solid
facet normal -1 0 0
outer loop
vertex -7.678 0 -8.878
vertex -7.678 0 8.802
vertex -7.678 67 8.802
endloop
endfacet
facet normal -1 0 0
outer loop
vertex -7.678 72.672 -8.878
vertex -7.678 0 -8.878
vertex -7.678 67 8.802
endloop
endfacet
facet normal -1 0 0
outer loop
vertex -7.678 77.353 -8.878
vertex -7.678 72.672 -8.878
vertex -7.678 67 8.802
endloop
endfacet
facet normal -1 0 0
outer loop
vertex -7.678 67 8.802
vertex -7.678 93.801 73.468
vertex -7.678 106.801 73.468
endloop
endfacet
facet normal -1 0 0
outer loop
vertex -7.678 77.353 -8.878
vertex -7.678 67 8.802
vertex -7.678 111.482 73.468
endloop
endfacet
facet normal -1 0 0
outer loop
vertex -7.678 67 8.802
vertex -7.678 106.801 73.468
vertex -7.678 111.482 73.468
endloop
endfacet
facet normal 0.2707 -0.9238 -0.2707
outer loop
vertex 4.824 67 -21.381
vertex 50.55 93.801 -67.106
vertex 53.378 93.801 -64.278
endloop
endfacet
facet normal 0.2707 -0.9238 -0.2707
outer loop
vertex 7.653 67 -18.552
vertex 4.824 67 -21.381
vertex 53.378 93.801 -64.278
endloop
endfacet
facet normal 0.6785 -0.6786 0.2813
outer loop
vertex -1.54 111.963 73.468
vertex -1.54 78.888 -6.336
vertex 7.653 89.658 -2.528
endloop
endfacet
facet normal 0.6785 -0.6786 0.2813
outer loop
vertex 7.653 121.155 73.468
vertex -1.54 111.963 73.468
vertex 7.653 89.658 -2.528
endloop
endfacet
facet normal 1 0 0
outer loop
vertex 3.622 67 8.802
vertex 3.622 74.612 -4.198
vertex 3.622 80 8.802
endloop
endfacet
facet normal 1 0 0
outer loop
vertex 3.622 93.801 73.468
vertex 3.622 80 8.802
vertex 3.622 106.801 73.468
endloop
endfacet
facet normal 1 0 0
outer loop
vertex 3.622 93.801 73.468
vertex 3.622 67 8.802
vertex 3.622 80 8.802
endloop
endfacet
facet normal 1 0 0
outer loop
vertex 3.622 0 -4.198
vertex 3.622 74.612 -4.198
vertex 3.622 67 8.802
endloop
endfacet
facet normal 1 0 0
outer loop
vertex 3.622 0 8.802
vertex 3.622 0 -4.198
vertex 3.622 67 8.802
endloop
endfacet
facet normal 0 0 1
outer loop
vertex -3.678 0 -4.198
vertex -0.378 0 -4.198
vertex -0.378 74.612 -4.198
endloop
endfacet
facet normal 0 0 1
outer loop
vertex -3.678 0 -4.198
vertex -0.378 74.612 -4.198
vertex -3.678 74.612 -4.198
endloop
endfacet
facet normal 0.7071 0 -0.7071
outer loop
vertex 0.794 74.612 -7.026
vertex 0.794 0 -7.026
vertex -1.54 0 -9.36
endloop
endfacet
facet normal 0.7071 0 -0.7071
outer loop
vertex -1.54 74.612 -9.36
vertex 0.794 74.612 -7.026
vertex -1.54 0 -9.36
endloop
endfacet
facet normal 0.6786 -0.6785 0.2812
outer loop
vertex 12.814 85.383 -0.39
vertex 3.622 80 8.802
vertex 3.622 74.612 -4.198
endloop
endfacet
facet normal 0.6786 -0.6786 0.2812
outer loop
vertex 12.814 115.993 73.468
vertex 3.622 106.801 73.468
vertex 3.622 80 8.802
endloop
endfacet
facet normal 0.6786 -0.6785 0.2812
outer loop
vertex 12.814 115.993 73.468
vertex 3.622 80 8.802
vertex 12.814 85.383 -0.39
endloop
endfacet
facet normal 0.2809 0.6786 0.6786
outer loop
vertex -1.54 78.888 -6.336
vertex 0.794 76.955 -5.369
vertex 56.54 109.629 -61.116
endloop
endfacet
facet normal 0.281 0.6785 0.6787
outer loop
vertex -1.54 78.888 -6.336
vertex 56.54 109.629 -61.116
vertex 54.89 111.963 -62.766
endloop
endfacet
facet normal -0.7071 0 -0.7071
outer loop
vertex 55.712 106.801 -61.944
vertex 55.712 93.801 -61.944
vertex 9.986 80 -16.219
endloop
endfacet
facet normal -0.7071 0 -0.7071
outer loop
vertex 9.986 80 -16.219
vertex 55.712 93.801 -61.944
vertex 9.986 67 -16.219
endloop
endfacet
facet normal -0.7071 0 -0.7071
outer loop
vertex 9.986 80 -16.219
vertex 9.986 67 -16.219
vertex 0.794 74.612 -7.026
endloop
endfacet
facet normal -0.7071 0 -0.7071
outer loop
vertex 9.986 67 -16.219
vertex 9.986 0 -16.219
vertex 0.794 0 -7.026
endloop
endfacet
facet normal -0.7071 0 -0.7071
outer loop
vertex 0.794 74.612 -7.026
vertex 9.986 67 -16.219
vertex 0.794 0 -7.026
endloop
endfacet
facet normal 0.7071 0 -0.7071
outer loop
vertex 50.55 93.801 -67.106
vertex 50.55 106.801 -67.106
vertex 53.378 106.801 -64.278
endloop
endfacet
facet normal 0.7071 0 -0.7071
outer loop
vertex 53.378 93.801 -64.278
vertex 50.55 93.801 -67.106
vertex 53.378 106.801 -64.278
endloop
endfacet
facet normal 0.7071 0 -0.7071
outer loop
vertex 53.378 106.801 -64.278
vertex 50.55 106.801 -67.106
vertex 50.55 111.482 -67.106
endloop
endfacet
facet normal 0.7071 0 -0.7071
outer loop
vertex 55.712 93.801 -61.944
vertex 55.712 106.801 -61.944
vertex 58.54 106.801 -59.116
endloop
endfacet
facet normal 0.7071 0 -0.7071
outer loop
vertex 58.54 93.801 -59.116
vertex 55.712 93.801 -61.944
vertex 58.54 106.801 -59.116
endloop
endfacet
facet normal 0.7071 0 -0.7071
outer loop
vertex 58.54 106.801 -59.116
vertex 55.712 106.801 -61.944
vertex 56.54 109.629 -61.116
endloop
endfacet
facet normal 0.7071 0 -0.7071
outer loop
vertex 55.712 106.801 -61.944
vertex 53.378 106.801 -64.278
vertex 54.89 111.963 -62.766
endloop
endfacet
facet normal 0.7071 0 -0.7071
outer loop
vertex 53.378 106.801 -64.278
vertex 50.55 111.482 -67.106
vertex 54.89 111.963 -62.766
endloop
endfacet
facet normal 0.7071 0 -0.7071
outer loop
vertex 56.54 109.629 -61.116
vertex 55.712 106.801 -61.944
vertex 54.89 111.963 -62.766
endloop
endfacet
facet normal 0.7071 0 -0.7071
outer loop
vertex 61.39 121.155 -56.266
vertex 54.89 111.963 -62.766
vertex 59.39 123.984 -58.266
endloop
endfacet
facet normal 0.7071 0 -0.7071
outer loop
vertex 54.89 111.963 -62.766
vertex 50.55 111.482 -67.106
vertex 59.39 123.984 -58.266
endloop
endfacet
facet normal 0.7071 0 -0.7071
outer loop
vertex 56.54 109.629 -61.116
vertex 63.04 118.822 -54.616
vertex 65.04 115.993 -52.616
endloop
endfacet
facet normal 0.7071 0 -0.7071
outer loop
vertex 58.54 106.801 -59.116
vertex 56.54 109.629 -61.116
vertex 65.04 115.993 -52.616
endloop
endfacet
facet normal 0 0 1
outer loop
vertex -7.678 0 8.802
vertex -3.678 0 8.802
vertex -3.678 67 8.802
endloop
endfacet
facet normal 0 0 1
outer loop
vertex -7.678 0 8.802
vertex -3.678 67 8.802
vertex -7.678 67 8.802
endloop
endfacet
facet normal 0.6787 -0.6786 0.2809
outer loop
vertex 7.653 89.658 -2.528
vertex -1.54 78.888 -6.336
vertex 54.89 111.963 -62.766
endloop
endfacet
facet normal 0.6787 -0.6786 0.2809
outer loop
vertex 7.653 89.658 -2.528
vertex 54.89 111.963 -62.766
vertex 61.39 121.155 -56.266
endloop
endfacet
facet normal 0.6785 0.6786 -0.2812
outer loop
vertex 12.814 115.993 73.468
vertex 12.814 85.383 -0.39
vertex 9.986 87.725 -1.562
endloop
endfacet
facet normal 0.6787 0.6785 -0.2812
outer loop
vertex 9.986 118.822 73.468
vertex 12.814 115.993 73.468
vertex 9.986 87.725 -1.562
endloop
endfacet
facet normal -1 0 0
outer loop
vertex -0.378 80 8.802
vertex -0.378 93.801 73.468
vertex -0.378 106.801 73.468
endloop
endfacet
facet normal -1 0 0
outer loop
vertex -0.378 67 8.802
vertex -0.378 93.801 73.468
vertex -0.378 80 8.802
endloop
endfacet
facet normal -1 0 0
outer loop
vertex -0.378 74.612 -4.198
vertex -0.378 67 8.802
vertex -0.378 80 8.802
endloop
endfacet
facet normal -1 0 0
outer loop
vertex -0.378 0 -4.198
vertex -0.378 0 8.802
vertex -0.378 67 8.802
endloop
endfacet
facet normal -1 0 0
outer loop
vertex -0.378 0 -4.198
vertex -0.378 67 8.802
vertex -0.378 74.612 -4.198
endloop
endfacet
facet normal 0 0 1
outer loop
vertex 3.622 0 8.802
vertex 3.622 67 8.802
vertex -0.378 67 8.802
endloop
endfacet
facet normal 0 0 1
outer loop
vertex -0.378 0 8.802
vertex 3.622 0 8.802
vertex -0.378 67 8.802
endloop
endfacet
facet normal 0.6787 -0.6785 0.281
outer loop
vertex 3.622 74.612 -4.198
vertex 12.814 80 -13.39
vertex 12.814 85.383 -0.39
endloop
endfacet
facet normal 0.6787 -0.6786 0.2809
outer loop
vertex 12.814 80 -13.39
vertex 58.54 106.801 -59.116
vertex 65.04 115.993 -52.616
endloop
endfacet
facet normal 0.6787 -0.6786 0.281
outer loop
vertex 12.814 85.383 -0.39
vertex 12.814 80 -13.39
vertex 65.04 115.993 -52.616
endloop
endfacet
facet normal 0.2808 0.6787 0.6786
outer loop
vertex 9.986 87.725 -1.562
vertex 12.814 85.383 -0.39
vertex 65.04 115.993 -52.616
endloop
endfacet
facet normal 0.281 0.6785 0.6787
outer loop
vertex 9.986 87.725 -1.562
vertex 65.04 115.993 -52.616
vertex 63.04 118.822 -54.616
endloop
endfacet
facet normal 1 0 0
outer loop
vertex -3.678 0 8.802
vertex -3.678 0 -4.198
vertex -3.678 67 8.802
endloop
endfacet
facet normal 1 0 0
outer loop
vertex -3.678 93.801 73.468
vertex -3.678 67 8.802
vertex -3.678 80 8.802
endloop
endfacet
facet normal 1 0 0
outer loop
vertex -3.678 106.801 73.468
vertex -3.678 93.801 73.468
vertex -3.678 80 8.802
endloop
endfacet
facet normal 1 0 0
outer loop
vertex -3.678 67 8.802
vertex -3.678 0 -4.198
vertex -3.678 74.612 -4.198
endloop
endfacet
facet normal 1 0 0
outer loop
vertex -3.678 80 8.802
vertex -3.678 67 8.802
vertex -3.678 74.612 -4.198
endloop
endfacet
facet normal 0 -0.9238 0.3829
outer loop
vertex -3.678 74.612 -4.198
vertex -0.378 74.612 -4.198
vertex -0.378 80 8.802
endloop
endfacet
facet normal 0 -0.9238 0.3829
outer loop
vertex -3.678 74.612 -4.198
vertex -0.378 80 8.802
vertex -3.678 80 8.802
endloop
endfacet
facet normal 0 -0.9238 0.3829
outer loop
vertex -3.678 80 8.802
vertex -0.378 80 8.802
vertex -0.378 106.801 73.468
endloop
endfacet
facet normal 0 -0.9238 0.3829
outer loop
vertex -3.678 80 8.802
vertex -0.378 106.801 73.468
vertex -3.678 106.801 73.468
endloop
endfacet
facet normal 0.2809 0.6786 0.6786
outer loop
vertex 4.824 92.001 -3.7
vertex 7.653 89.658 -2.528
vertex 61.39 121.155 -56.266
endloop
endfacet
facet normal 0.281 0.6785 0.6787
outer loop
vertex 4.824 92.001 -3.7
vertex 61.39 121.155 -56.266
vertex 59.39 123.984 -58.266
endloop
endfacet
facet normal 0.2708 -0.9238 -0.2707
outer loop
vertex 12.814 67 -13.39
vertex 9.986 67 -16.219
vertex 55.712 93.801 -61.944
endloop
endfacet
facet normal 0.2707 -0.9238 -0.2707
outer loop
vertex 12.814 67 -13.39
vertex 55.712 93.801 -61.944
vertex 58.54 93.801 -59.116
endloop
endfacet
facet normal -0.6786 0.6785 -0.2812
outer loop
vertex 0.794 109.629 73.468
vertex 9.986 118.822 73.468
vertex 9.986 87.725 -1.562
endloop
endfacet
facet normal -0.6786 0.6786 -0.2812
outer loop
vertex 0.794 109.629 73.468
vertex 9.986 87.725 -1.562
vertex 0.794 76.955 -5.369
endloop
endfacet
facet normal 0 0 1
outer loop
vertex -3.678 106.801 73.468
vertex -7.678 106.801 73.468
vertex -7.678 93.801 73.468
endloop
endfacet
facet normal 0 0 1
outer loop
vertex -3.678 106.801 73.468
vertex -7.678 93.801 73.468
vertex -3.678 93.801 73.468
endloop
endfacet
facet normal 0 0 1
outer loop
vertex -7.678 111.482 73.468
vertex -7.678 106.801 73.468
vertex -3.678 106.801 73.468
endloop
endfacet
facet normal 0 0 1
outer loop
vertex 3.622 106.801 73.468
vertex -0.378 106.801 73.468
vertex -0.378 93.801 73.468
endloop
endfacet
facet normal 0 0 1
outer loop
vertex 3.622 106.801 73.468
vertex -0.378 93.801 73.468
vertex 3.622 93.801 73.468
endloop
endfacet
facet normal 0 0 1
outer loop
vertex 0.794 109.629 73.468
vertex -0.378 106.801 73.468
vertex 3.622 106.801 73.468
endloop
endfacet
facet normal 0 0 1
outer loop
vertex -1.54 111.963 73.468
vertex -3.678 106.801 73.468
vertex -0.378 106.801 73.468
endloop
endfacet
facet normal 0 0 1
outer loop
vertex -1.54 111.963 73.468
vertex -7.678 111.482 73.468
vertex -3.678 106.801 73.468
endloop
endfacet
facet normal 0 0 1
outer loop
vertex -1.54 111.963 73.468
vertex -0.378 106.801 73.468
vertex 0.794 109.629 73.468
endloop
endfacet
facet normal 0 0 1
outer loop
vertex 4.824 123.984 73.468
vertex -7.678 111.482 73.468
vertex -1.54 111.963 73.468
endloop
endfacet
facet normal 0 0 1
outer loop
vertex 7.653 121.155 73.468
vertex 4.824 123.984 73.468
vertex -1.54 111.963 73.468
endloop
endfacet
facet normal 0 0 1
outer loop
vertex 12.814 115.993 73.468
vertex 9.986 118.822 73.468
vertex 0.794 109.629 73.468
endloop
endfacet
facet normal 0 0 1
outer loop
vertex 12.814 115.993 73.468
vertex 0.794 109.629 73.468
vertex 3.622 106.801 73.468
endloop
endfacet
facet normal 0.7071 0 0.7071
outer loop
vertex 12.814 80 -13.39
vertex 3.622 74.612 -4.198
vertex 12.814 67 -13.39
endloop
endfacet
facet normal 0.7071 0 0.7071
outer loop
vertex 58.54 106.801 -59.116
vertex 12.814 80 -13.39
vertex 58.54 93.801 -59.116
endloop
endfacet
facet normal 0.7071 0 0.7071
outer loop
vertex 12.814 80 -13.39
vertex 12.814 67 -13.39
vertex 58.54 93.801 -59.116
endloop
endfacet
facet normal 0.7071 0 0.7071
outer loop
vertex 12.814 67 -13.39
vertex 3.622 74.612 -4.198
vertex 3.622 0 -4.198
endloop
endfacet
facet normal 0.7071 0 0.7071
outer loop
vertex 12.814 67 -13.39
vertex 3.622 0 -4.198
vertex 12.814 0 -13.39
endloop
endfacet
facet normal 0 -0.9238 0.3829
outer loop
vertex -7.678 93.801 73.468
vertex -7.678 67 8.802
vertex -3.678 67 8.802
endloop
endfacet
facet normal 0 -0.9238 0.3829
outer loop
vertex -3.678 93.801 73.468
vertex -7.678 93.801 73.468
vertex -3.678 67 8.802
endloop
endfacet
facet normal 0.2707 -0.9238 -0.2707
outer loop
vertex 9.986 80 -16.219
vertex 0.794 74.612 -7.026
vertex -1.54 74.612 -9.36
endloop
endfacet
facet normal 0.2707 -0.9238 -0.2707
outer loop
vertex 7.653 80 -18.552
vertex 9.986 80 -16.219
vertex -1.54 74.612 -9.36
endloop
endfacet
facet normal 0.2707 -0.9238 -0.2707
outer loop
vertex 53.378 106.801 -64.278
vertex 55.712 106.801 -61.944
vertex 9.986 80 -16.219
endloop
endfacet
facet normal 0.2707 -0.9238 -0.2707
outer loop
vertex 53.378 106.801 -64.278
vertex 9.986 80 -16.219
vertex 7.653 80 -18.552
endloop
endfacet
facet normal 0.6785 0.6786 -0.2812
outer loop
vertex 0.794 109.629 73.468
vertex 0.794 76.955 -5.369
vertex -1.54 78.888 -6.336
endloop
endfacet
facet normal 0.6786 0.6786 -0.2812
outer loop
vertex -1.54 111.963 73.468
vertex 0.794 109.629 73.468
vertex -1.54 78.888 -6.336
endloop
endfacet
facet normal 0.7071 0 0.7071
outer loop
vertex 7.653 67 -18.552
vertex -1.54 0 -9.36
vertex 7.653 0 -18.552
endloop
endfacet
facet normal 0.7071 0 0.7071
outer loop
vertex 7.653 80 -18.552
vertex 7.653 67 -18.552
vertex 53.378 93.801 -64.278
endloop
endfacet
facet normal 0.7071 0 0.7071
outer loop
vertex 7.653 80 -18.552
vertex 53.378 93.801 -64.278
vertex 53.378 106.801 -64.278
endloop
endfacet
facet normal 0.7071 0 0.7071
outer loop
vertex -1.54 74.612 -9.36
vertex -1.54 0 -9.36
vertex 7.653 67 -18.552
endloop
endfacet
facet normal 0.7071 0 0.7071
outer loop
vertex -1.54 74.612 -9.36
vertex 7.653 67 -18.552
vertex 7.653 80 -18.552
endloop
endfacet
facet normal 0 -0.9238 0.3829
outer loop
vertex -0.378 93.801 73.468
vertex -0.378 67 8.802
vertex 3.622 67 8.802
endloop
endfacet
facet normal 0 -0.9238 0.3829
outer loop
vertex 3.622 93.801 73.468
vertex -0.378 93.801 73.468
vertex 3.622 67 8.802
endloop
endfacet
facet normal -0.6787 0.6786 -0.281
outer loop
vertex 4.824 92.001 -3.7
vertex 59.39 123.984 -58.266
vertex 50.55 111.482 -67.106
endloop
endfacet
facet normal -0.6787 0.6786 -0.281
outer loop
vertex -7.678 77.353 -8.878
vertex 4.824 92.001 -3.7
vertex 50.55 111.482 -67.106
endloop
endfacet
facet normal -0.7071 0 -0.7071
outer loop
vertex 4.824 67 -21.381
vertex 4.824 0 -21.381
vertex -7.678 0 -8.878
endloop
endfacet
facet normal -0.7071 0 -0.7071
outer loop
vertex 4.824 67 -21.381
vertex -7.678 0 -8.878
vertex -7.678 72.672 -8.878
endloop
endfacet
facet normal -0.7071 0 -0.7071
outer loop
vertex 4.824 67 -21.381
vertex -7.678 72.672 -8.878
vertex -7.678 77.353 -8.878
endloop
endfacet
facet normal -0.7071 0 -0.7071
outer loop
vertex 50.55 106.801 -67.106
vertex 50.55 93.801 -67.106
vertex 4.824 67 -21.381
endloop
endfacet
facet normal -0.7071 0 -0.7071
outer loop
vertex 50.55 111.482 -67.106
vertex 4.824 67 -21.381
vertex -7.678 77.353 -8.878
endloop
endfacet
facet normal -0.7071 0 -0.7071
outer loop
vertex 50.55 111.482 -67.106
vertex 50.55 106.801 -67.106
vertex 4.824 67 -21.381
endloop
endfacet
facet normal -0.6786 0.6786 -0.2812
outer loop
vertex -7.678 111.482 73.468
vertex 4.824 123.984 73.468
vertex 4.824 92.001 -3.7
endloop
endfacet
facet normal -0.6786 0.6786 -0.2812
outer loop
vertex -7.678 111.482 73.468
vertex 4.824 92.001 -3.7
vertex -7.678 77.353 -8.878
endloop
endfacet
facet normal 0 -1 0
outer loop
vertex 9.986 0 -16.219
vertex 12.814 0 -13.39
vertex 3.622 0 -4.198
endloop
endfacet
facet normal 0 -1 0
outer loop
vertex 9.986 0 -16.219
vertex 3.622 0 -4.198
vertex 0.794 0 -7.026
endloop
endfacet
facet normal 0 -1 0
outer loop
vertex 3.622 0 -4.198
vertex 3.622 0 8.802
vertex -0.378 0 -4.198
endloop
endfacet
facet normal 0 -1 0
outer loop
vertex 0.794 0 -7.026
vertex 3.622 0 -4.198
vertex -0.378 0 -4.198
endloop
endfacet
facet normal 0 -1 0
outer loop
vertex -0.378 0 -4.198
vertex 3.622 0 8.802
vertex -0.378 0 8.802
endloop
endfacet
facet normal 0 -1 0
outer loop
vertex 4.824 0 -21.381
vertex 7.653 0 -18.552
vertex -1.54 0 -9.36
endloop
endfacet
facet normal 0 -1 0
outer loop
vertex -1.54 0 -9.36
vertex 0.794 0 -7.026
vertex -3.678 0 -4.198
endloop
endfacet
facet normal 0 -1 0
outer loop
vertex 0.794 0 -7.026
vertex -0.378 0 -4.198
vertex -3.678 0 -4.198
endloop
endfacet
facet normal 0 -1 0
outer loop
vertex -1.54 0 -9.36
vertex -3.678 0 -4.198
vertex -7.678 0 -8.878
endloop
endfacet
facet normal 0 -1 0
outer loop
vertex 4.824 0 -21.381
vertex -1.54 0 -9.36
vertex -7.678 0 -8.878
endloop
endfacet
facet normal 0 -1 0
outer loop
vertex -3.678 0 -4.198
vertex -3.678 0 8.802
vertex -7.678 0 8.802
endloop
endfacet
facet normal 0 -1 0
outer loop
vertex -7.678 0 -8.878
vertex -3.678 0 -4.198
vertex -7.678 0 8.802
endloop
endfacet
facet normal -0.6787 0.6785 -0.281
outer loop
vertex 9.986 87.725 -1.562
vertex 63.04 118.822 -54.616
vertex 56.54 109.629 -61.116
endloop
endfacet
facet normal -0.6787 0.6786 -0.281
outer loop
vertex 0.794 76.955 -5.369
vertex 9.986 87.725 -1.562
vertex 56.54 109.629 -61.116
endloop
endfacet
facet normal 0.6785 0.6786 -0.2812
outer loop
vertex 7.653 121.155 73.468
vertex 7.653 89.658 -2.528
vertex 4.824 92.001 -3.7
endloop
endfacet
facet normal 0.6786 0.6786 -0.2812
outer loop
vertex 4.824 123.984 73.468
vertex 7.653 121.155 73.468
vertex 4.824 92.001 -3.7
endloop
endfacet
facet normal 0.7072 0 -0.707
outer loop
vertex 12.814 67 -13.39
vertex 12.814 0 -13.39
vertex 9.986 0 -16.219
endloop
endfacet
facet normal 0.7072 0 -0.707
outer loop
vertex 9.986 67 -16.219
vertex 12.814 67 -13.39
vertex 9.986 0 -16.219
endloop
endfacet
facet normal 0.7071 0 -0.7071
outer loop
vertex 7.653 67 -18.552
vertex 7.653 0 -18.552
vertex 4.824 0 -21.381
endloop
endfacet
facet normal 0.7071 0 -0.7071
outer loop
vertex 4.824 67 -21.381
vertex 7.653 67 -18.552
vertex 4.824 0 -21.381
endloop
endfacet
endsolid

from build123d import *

# Parameters (mm, degrees)
BOSS_EXTRUDE1_DEPTH = 80
CUT_EXTRUDE2_DEPTH  = 82.280481137
SKETCH6_W           = 4
SKETCH6_H           = 13
BOSS_EXTRUDE6_DEPTH = 70
BOSS_EXTRUDE7_REACH = 148.386
BOSS_EXTRUDE8_REACH = 152.425


with BuildPart() as part:
    # Sketch1 → Boss-Extrude1 (new body)
    with BuildSketch(Plane(origin=(0, 0, 0), x_dir=(1, 0, 0), z_dir=(0, 1, 0))):
        Polygon((3.622068507, 4.197822071), (3.622068507, -8.802177929), (-0.377931493, -8.802177929), (-0.377931493, 4.197822071), (-3.677931493, 4.197822071), (-3.677931493, -8.802177929), (-7.677931493, -8.802177929), (-7.677931493, 8.878435326), align=None)
    extrude(amount=BOSS_EXTRUDE1_DEPTH)

    # Sketch2 → Cut-Extrude2 (cut, through all)
    with BuildSketch(Plane.ZY.offset(7.677931493)):
        Polygon((8.802177929, 80), (-8.878435326, 80), (-8.878435326, 72.672231838), align=None)
    extrude(amount=-CUT_EXTRUDE2_DEPTH, mode=Mode.SUBTRACT)

    # Sketch6 → Boss-Extrude6 (add, along a direction that is not the sketch's normal)
    with BuildSketch(Plane.XY.offset(8.802177929)):
        with Locations((-5.677931493, 73.5)):
            Rectangle(SKETCH6_W, SKETCH6_H)
        with Locations((1.622068507, 73.5)):
            Rectangle(SKETCH6_W, SKETCH6_H)
    extrude(amount=BOSS_EXTRUDE6_DEPTH, dir=(0, 0.38287155344466034, 0.9238015877681054))

    # Boss-Extrude7: up to this plane
    boss_extrude7_end = Plane(origin=(3.622068507, 80, -4.197822071), z_dir=(-0.3826834323650841, 0, 0.9238795325112892))
    # Sketch7 → Boss-Extrude7 (add, up to the surface)
    with BuildSketch(Plane.XY.offset(73.468289073), mode=Mode.PRIVATE) as boss_extrude7_sk1:
        Polygon((3.622068507, 106.801008741), (-7.677931493, 106.801008741), (-7.677931493, 111.481621996), align=None)
    boss_extrude7_tool1 = split(extrude(boss_extrude7_sk1.sketch, amount=BOSS_EXTRUDE7_REACH, dir=(0, -0.382871553445, -0.923801587768), mode=Mode.PRIVATE), bisect_by=boss_extrude7_end, keep=Keep.BOTH, mode=Mode.PRIVATE)
    add(boss_extrude7_tool1.solids().sort_by_distance((-3.911265, 108.361213, 73.468289))[0])

    # Boss-Extrude8: up to this plane
    boss_extrude8_end = Plane(origin=(3.622068507, 80, -4.197822071), z_dir=(-0.3826834323650841, 0, 0.9238795325112892))
    # Sketch14 → Boss-Extrude8 (add, up to the surface)
    with BuildSketch(Plane.XY.offset(73.468289073), mode=Mode.PRIVATE) as boss_extrude8_sk1:
        Polygon((7.65257716, 121.155276399), (4.824150035, 123.983703524), (-7.677931493, 111.481621996), (3.622068507, 106.801008741), (12.814456663, 115.993396897), (9.986029538, 118.821824021), (0.793641383, 109.629435866), (-1.539810995, 111.962888244), align=None)
    boss_extrude8_tool1 = split(extrude(boss_extrude8_sk1.sketch, amount=BOSS_EXTRUDE8_REACH, dir=(0, -0.382871553445, -0.923801587768), mode=Mode.PRIVATE), bisect_by=boss_extrude8_end, keep=Keep.BOTH, mode=Mode.PRIVATE)
    add(boss_extrude8_tool1.solids().sort_by_distance((6.049263, 122.380389, 73.468289))[0])

    # Mirror9: part across plane


with BuildPart() as part_1:
    add(part.part)
    add(part.part.mirror(Plane(origin=(2.014593878, 0, -4.863659863), x_dir=(0.9238795325112891, 0, 0.3826834323650842), z_dir=(0.3826834323650841, 0, -0.9238795325112892))))


solid = part_1.part
